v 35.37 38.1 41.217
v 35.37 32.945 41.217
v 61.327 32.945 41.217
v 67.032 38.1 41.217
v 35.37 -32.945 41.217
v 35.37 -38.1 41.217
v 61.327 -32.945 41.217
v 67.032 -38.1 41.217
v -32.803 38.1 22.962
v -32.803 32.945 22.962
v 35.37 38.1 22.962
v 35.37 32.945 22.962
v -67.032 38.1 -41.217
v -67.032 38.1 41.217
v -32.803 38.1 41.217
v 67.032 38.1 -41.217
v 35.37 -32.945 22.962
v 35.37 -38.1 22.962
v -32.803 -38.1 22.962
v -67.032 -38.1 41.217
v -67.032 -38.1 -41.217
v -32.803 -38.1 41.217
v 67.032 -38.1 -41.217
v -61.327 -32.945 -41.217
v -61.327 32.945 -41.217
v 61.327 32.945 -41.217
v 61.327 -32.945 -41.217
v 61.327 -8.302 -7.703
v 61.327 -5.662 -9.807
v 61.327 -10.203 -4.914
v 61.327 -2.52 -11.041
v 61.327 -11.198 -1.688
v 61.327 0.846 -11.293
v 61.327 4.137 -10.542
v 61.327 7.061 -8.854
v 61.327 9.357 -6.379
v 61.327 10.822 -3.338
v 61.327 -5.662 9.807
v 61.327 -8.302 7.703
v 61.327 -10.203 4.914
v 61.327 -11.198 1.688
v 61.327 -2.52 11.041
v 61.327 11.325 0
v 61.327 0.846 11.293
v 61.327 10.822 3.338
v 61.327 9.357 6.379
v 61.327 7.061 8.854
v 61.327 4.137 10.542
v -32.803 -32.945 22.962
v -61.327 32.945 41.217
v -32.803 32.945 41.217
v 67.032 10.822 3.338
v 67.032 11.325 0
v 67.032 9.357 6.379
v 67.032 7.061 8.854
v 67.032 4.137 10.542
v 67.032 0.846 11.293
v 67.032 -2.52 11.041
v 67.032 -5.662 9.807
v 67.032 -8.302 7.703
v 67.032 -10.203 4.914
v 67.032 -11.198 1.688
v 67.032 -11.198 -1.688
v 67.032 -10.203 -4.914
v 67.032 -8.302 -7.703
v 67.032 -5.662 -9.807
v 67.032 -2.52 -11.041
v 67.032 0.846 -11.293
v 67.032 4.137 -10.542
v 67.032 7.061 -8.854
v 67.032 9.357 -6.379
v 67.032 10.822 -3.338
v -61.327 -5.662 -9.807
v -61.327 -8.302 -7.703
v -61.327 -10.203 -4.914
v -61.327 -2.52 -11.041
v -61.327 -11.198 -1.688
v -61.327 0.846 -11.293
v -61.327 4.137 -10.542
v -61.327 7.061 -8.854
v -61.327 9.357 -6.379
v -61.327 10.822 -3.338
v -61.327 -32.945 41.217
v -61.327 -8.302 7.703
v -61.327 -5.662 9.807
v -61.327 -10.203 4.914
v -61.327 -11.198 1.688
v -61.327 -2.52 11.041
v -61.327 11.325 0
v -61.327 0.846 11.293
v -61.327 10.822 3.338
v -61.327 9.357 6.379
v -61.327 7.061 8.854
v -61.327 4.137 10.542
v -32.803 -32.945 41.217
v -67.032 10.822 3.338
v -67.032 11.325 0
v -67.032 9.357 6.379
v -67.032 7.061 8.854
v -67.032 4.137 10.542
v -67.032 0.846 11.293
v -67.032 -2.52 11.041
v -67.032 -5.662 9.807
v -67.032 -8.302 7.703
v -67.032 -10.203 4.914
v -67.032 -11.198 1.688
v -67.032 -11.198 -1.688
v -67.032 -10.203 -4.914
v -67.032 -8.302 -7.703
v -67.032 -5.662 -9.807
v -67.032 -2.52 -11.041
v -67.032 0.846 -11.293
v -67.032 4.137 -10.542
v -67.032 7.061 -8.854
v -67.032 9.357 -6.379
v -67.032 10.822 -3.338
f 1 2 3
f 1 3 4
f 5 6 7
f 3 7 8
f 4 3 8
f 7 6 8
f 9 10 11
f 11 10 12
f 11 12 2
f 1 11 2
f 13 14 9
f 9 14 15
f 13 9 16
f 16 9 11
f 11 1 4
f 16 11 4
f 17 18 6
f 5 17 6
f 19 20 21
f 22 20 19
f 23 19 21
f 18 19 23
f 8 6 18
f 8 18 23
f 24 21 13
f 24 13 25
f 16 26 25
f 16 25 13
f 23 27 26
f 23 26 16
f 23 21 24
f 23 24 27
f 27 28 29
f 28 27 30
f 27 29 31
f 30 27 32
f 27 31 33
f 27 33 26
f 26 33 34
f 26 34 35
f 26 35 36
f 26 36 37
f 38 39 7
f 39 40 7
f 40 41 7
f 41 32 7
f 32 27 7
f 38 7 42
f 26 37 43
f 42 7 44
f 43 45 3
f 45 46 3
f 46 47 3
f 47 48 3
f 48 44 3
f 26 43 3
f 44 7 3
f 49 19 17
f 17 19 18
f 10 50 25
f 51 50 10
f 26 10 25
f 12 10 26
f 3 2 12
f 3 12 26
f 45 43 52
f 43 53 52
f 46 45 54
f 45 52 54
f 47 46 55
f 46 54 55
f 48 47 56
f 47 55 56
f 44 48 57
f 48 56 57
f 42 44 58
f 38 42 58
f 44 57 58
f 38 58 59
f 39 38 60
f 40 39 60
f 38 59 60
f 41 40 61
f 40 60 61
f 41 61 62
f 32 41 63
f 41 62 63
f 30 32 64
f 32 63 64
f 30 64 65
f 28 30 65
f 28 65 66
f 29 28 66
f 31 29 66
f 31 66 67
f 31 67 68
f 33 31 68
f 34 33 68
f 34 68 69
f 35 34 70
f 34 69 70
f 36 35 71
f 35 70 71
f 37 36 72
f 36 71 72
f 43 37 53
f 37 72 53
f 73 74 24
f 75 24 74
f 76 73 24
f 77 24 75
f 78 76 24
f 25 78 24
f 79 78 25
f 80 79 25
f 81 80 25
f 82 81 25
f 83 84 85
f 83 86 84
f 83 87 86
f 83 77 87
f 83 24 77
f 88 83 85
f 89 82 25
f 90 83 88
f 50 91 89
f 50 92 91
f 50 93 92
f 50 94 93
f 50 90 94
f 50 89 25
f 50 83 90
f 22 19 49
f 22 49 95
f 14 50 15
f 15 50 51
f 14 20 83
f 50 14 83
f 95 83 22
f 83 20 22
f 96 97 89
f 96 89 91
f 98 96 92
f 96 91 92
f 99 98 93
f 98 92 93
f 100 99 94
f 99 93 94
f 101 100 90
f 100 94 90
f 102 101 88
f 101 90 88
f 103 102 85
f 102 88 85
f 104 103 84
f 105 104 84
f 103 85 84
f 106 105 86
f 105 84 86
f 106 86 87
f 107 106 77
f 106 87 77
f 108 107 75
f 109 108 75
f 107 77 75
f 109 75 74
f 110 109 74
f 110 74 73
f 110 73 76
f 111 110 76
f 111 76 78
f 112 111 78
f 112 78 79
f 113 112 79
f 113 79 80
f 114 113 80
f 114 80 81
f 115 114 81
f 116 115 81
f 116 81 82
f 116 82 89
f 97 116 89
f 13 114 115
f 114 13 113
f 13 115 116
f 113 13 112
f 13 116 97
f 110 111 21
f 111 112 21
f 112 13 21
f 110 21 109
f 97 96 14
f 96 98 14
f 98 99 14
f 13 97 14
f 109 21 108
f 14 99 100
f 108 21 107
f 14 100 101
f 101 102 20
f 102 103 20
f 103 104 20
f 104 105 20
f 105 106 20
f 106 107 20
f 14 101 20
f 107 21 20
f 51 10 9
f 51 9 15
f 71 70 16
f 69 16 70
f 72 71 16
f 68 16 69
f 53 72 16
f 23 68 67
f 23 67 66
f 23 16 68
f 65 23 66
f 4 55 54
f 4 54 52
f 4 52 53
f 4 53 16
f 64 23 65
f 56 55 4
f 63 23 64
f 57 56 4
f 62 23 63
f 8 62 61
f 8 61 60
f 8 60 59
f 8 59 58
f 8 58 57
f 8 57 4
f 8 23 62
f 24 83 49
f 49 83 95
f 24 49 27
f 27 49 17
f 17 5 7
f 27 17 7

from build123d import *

# Parameters (mm, degrees)
F0_W          = 134.0631097555
F0_H          = 82.4345424771
F1_DEPTH      = 38.1
F1_DEPTH_BACK = 38.1
F2_R          = 11.3246281271
F3_DEPTH      = 93.726
F3_DEPTH_BACK = 71.374
F4_W          = 68.1725181639
F4_H          = 33.9436363429
F5_DEPTH      = 44.958
F5_DEPTH_BACK = 59.69
F6_W          = 122.6534843445
F6_H          = 65.8905878663
F7_DEPTH      = 79.756
F7_DEPTH_BACK = 65.786


with BuildPart() as f1:
    # F0 (on Front) → F1 (new body, two sides)
    with BuildSketch(Plane.XZ) as f1_sk:
        Rectangle(F0_W, F0_H)
    extrude(amount=F1_DEPTH)
    extrude(f1_sk.sketch, amount=-F1_DEPTH_BACK)

    # F2 (on Right) → F3 (cut, two sides)
    with BuildSketch(Plane.YZ) as f3_sk:
        Circle(F2_R)
    extrude(amount=F3_DEPTH, mode=Mode.SUBTRACT)
    extrude(f3_sk.sketch, amount=-F3_DEPTH_BACK, mode=Mode.SUBTRACT)

    # F4 (on Front) → F5 (cut, two sides)
    with BuildSketch(Plane.XZ) as f5_sk:
        with Locations((1.2835841626, 39.9336898699)):
            Rectangle(F4_W, F4_H)
    extrude(amount=-F5_DEPTH, mode=Mode.SUBTRACT)
    extrude(f5_sk.sketch, amount=F5_DEPTH_BACK, mode=Mode.SUBTRACT)

    # F6 (on Top) → F7 (cut, two sides)
    with BuildSketch(Plane.XY) as f7_sk:
        Rectangle(F6_W, F6_H)
    extrude(amount=-F7_DEPTH, mode=Mode.SUBTRACT)
    extrude(f7_sk.sketch, amount=F7_DEPTH_BACK, mode=Mode.SUBTRACT)


solid = f1.part
